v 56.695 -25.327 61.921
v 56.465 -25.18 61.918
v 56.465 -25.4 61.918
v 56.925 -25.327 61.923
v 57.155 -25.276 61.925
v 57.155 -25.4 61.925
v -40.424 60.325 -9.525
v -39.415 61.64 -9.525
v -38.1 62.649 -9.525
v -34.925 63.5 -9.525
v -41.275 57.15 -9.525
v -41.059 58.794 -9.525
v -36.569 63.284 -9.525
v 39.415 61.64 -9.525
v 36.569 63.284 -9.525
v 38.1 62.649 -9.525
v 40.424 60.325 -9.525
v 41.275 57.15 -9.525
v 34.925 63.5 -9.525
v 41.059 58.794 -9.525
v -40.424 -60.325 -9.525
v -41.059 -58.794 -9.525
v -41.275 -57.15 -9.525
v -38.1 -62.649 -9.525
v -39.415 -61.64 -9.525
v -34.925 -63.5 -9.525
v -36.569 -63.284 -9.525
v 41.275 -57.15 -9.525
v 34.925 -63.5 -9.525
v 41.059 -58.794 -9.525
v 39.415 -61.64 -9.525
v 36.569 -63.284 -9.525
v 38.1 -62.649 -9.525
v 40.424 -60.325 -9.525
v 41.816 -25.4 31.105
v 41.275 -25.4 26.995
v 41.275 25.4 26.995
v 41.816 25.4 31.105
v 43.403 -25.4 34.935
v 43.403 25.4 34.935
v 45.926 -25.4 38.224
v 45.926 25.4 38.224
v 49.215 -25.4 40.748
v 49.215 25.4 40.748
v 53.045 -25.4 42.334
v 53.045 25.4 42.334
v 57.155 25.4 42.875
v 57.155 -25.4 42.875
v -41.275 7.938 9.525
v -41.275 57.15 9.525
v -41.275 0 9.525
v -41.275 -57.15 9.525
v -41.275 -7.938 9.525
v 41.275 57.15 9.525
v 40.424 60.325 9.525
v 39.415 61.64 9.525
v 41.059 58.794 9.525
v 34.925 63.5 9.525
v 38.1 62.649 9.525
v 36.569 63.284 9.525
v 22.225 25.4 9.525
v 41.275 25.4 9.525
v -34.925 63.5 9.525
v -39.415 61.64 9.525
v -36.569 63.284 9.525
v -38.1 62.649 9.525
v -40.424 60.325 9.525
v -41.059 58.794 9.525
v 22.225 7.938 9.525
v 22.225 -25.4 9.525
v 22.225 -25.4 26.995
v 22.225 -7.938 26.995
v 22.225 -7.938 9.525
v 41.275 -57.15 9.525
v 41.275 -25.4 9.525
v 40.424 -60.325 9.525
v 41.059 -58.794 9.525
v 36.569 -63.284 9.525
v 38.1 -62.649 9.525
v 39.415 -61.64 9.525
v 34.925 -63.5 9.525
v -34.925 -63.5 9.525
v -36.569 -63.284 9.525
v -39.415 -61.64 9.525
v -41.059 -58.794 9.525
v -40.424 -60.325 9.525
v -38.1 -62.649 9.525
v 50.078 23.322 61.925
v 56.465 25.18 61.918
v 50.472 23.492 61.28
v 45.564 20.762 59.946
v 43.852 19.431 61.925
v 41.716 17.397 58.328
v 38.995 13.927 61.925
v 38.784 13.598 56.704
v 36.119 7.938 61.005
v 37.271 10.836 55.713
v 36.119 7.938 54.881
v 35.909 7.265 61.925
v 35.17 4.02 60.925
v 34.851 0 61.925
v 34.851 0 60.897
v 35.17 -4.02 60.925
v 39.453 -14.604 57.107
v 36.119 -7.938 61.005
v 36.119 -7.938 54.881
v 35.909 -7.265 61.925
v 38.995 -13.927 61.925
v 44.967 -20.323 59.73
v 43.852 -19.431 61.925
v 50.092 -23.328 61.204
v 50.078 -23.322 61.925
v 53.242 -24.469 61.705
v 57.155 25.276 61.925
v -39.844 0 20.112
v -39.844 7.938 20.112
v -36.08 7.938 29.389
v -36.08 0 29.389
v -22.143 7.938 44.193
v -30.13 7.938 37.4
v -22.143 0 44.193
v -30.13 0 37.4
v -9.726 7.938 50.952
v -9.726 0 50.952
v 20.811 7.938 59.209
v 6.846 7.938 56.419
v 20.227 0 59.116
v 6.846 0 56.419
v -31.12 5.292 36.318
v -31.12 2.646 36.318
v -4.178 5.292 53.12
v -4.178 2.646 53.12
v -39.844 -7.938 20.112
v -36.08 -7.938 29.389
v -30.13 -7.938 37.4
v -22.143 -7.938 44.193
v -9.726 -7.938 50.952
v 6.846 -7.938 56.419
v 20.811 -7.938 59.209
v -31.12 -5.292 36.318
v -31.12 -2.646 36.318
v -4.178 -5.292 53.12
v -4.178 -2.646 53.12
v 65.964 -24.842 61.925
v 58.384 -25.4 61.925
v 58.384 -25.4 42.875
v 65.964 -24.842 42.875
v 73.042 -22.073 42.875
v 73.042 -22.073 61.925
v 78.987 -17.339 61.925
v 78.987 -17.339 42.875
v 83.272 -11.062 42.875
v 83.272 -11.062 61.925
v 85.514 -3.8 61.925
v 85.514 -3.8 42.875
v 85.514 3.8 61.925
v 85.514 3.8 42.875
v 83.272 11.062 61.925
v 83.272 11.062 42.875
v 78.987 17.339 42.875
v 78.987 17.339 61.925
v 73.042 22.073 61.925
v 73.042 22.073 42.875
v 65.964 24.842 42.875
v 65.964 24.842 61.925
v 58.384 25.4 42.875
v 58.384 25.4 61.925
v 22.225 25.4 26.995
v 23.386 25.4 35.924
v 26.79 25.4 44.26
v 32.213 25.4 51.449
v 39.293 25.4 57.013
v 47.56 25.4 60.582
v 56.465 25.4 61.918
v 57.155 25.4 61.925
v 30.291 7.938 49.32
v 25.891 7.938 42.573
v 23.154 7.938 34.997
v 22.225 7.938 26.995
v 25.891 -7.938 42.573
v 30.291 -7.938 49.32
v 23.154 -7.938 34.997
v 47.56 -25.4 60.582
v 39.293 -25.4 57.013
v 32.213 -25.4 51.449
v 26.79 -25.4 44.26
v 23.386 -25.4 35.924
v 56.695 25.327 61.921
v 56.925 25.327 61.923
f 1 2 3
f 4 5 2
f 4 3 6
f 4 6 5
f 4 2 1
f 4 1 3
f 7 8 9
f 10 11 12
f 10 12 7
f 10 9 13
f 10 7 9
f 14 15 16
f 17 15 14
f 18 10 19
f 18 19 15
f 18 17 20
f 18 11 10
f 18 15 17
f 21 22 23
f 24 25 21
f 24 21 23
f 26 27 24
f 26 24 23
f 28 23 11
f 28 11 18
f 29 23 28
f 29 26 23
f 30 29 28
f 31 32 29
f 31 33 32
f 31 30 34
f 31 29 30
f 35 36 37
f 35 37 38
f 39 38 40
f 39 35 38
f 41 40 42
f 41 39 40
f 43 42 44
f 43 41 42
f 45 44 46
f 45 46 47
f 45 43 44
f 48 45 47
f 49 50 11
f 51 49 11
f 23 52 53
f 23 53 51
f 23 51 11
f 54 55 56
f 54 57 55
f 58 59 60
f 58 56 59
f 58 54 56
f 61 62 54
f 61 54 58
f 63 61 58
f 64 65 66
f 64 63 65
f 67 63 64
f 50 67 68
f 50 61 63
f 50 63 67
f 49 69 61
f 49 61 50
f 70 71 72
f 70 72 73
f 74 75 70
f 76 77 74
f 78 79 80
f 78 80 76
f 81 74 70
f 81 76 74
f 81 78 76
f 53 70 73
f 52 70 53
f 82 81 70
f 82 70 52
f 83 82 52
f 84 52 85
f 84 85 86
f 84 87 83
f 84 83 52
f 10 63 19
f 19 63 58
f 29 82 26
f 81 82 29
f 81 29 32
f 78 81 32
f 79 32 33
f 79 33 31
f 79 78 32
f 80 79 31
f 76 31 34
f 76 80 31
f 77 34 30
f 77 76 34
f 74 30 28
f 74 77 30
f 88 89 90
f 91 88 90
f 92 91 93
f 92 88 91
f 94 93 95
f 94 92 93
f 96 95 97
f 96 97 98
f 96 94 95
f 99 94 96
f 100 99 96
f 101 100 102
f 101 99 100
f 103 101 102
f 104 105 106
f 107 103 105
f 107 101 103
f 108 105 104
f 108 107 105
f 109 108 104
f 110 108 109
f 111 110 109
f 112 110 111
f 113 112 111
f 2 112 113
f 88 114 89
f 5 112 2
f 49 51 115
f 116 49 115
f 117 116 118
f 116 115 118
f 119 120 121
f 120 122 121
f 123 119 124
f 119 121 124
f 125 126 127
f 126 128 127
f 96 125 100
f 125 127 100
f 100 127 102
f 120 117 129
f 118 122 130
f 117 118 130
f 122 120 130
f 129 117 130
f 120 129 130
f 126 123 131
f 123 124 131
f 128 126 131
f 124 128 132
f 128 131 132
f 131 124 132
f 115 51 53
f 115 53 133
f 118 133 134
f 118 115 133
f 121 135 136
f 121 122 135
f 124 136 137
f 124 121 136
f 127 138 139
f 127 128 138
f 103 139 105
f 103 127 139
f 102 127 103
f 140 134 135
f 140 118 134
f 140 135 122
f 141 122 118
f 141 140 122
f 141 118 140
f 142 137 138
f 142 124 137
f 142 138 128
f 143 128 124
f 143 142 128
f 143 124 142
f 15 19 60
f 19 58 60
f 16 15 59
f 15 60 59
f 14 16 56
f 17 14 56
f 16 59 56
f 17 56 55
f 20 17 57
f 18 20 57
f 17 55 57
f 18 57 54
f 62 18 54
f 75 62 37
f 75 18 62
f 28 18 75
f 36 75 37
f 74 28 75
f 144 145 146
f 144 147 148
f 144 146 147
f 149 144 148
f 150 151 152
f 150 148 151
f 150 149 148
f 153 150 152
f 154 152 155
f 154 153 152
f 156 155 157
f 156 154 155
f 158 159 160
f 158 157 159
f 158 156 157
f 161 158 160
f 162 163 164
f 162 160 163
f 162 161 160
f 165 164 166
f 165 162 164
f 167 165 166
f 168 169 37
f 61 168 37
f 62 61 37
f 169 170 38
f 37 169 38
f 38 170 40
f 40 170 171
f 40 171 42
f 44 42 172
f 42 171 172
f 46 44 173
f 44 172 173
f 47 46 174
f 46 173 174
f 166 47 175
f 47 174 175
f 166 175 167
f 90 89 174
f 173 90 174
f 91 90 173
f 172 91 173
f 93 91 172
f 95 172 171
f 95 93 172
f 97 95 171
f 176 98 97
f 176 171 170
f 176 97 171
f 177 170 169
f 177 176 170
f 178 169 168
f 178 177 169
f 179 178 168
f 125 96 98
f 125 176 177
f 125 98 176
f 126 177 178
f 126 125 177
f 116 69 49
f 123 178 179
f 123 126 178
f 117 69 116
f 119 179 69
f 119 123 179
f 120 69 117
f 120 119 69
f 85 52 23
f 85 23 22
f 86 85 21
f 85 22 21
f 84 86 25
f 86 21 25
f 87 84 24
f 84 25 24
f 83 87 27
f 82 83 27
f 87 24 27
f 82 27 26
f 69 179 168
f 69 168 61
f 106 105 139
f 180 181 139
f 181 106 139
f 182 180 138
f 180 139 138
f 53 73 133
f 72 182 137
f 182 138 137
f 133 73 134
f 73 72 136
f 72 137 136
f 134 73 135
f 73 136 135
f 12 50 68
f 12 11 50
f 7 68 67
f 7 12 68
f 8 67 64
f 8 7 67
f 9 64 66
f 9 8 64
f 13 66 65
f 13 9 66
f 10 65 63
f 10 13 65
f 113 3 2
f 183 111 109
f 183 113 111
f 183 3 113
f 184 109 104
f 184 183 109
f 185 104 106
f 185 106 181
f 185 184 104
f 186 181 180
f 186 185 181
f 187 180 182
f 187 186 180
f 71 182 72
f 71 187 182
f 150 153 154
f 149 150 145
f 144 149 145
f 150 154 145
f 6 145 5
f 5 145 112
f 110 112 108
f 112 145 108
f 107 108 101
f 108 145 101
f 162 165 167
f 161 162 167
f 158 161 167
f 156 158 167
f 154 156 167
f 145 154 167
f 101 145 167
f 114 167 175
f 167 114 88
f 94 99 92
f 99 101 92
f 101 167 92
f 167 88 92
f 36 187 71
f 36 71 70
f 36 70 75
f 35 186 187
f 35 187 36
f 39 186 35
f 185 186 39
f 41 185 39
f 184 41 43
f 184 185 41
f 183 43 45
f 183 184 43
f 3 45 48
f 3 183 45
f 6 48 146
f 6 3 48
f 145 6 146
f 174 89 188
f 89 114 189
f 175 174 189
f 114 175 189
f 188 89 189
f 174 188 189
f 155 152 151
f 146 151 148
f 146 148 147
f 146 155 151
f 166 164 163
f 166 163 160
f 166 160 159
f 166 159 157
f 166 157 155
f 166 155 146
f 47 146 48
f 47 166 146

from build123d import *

# Parameters (mm, degrees)
F1_DEPTH = 63.5
F2_DEPTH = 25.4
F3_DEPTH = 7.9375
F0_W     = 25.47402
F0_H     = 19.05
F5_R     = 6.35


with BuildPart() as f1:
    # F0 (on Front) → F1 (new body, symmetric)
    with BuildSketch(Plane.XZ):
        Polygon((22.225, 9.525), (-41.275, 9.525), (-41.275, -9.525), (41.275, -9.525), (41.275, 9.525), align=None)
    extrude(amount=F1_DEPTH, both=True)

    # F0 (on Front) → F2 (join, symmetric)
    with BuildSketch(Plane.XZ):
        with BuildLine():
            Line((22.225, 26.99499), (22.225, 9.525))
            Line((22.225, 9.525), (41.275, 9.525))
            Line((41.275, 9.525), (41.275, 26.99499))
            ThreePointArc((41.275, 26.99499), (45.926206, 38.223994), (57.15521, 42.8752))
            Line((57.15521, 42.8752), (60.325, 42.8752))
            Line((60.325, 42.8752), (60.325, 61.9252))
            Line((60.325, 61.9252), (57.15521, 61.9252))
            add(Edge.make_bspline(
                [(56.465119, 61.918383), (56.694879, 61.920891), (56.92491, 61.923164), (57.15521, 61.9252)],
                knots=[111.059822, 111.059822, 111.059822, 111.059822, 111.509135, 111.509135, 111.509135, 111.509135], degree=3))
            ThreePointArc((56.465119, 61.918383), (32.213031, 51.449178), (22.225, 26.99499))
        make_face()
    extrude(amount=F2_DEPTH, both=True)

    # F0 (on Front) → F3 (join, symmetric)
    with BuildSketch(Plane.XZ):
        with BuildLine():
            add(Edge.make_bspline(
                [(-41.275, 9.525), (-40.571277, 46.227381), (-0.326284, 61.298251), (56.465119, 61.918383)],
                knots=[0, 0, 0, 0, 111.059822, 111.059822, 111.059822, 111.059822], degree=3))
            Line((-41.275, 9.525), (22.225, 9.525))
            Line((22.225, 9.525), (22.225, 26.99499))
            ThreePointArc((22.225, 26.99499), (32.213031, 51.449178), (56.465119, 61.918383))
        make_face()
    extrude(amount=F3_DEPTH, both=True)

    # F0 (on Front) → F4 (revolve)
    with BuildSketch(Plane.XZ):
        with Locations((73.06201, 52.4002)):
            Rectangle(F0_W, F0_H)
    revolve(axis=Axis((60.325, 0, 52.3875), (0, 0, 1)))

    # F5
    f5_edges = [f1.edges().sort_by_distance(p)[0] for p in [
        (41.275, 63.5, 0),
        (-41.275, 63.5, 0),
        (41.275, -63.5, 0),
        (-41.275, -63.5, 0),
    ]]
    fillet(f5_edges, radius=F5_R)


solid = f1.part
